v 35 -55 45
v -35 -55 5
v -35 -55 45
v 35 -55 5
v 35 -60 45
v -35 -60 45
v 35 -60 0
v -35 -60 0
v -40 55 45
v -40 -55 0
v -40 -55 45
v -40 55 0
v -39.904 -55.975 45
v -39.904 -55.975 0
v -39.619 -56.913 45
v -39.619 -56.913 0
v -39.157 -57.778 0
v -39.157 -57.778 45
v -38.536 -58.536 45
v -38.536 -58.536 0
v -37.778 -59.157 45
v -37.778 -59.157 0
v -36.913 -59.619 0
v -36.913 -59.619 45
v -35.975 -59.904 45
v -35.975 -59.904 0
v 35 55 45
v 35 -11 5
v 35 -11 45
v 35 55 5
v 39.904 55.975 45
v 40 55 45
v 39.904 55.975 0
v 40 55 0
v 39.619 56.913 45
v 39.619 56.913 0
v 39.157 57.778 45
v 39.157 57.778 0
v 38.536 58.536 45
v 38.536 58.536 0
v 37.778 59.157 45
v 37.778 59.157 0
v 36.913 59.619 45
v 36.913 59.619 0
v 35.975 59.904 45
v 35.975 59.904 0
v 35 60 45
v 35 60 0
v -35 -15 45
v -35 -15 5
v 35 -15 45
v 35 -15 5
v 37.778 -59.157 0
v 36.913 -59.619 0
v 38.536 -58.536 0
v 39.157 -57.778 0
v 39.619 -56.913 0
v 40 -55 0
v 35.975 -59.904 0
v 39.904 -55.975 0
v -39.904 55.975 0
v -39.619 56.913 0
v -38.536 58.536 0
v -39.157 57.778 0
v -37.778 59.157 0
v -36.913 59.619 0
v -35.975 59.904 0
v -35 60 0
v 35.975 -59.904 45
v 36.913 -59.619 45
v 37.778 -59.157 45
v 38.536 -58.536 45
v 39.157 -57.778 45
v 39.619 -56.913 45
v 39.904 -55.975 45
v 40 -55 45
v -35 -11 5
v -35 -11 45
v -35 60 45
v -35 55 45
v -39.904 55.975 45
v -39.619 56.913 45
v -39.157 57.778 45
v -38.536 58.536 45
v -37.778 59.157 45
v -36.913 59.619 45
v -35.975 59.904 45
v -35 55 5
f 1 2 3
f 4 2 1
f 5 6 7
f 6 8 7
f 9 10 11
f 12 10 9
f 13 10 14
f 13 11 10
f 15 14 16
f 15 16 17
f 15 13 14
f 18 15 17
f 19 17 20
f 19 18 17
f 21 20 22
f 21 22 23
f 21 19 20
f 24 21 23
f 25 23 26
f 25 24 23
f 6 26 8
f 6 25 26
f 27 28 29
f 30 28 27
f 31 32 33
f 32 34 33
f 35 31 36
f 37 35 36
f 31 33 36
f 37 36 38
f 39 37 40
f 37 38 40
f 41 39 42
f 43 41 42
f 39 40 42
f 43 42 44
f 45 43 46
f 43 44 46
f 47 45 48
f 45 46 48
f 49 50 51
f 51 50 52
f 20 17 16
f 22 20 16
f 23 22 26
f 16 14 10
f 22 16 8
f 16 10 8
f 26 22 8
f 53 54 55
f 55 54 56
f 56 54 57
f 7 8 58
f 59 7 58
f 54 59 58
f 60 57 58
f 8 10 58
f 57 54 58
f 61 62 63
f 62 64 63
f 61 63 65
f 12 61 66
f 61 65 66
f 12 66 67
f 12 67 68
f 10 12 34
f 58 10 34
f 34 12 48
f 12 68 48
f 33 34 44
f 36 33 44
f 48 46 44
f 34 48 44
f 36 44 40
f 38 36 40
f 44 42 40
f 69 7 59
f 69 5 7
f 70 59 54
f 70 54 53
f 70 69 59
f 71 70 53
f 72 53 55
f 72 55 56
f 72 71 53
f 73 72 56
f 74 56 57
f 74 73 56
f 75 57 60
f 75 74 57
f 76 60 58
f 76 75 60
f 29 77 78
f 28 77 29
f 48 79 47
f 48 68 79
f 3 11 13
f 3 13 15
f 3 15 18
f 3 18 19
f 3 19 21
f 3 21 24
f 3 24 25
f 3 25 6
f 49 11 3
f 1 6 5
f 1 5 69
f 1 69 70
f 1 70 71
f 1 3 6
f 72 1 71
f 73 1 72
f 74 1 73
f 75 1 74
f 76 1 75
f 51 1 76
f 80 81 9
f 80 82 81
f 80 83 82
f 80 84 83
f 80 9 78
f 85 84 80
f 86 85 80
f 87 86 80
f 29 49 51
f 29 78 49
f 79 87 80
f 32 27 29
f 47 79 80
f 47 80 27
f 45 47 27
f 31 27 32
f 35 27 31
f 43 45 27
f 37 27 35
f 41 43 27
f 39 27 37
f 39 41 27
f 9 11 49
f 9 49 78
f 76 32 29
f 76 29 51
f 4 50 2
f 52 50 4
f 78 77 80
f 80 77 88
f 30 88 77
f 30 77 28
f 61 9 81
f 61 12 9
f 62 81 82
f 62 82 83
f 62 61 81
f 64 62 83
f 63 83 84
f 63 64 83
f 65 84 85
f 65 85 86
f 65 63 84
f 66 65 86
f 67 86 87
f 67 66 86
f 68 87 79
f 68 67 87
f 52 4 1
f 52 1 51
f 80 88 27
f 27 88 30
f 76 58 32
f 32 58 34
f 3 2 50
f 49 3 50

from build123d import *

# Parameters (mm, degrees)
SKETCH1_W           = 80
SKETCH1_H           = 120
BOSS_EXTRUDE1_DEPTH = 5
SKETCH2_W           = 80
SKETCH2_H           = 120
SKETCH2_W_2         = 70
SKETCH2_H_2         = 66
SKETCH2_H_3         = 40
BOSS_EXTRUDE2_DEPTH = 40
FILLET1_R           = 5


with BuildPart() as part:
    # Sketch1 → Boss-Extrude1 (new body)
    with BuildSketch(Plane.XY):
        Rectangle(SKETCH1_W, SKETCH1_H)
    extrude(amount=BOSS_EXTRUDE1_DEPTH)

    # Sketch2 → Boss-Extrude2 (add)
    with BuildSketch(Plane.XY.offset(5)):
        Rectangle(SKETCH2_W, SKETCH2_H)
        with Locations((0, 22)):
            Rectangle(SKETCH2_W_2, SKETCH2_H_2, mode=Mode.SUBTRACT)
        with Locations((0, -35)):
            Rectangle(SKETCH2_W_2, SKETCH2_H_3, mode=Mode.SUBTRACT)
    extrude(amount=BOSS_EXTRUDE2_DEPTH)

    # Fillet1
    fillet1_edges = [part.edges().sort_by_distance(p)[0] for p in [
        (40, -60, 22.5),
        (-40, -60, 22.5),
        (-40, 60, 22.5),
        (40, 60, 22.5),
    ]]
    fillet(fillet1_edges, radius=FILLET1_R)


solid = part.part
